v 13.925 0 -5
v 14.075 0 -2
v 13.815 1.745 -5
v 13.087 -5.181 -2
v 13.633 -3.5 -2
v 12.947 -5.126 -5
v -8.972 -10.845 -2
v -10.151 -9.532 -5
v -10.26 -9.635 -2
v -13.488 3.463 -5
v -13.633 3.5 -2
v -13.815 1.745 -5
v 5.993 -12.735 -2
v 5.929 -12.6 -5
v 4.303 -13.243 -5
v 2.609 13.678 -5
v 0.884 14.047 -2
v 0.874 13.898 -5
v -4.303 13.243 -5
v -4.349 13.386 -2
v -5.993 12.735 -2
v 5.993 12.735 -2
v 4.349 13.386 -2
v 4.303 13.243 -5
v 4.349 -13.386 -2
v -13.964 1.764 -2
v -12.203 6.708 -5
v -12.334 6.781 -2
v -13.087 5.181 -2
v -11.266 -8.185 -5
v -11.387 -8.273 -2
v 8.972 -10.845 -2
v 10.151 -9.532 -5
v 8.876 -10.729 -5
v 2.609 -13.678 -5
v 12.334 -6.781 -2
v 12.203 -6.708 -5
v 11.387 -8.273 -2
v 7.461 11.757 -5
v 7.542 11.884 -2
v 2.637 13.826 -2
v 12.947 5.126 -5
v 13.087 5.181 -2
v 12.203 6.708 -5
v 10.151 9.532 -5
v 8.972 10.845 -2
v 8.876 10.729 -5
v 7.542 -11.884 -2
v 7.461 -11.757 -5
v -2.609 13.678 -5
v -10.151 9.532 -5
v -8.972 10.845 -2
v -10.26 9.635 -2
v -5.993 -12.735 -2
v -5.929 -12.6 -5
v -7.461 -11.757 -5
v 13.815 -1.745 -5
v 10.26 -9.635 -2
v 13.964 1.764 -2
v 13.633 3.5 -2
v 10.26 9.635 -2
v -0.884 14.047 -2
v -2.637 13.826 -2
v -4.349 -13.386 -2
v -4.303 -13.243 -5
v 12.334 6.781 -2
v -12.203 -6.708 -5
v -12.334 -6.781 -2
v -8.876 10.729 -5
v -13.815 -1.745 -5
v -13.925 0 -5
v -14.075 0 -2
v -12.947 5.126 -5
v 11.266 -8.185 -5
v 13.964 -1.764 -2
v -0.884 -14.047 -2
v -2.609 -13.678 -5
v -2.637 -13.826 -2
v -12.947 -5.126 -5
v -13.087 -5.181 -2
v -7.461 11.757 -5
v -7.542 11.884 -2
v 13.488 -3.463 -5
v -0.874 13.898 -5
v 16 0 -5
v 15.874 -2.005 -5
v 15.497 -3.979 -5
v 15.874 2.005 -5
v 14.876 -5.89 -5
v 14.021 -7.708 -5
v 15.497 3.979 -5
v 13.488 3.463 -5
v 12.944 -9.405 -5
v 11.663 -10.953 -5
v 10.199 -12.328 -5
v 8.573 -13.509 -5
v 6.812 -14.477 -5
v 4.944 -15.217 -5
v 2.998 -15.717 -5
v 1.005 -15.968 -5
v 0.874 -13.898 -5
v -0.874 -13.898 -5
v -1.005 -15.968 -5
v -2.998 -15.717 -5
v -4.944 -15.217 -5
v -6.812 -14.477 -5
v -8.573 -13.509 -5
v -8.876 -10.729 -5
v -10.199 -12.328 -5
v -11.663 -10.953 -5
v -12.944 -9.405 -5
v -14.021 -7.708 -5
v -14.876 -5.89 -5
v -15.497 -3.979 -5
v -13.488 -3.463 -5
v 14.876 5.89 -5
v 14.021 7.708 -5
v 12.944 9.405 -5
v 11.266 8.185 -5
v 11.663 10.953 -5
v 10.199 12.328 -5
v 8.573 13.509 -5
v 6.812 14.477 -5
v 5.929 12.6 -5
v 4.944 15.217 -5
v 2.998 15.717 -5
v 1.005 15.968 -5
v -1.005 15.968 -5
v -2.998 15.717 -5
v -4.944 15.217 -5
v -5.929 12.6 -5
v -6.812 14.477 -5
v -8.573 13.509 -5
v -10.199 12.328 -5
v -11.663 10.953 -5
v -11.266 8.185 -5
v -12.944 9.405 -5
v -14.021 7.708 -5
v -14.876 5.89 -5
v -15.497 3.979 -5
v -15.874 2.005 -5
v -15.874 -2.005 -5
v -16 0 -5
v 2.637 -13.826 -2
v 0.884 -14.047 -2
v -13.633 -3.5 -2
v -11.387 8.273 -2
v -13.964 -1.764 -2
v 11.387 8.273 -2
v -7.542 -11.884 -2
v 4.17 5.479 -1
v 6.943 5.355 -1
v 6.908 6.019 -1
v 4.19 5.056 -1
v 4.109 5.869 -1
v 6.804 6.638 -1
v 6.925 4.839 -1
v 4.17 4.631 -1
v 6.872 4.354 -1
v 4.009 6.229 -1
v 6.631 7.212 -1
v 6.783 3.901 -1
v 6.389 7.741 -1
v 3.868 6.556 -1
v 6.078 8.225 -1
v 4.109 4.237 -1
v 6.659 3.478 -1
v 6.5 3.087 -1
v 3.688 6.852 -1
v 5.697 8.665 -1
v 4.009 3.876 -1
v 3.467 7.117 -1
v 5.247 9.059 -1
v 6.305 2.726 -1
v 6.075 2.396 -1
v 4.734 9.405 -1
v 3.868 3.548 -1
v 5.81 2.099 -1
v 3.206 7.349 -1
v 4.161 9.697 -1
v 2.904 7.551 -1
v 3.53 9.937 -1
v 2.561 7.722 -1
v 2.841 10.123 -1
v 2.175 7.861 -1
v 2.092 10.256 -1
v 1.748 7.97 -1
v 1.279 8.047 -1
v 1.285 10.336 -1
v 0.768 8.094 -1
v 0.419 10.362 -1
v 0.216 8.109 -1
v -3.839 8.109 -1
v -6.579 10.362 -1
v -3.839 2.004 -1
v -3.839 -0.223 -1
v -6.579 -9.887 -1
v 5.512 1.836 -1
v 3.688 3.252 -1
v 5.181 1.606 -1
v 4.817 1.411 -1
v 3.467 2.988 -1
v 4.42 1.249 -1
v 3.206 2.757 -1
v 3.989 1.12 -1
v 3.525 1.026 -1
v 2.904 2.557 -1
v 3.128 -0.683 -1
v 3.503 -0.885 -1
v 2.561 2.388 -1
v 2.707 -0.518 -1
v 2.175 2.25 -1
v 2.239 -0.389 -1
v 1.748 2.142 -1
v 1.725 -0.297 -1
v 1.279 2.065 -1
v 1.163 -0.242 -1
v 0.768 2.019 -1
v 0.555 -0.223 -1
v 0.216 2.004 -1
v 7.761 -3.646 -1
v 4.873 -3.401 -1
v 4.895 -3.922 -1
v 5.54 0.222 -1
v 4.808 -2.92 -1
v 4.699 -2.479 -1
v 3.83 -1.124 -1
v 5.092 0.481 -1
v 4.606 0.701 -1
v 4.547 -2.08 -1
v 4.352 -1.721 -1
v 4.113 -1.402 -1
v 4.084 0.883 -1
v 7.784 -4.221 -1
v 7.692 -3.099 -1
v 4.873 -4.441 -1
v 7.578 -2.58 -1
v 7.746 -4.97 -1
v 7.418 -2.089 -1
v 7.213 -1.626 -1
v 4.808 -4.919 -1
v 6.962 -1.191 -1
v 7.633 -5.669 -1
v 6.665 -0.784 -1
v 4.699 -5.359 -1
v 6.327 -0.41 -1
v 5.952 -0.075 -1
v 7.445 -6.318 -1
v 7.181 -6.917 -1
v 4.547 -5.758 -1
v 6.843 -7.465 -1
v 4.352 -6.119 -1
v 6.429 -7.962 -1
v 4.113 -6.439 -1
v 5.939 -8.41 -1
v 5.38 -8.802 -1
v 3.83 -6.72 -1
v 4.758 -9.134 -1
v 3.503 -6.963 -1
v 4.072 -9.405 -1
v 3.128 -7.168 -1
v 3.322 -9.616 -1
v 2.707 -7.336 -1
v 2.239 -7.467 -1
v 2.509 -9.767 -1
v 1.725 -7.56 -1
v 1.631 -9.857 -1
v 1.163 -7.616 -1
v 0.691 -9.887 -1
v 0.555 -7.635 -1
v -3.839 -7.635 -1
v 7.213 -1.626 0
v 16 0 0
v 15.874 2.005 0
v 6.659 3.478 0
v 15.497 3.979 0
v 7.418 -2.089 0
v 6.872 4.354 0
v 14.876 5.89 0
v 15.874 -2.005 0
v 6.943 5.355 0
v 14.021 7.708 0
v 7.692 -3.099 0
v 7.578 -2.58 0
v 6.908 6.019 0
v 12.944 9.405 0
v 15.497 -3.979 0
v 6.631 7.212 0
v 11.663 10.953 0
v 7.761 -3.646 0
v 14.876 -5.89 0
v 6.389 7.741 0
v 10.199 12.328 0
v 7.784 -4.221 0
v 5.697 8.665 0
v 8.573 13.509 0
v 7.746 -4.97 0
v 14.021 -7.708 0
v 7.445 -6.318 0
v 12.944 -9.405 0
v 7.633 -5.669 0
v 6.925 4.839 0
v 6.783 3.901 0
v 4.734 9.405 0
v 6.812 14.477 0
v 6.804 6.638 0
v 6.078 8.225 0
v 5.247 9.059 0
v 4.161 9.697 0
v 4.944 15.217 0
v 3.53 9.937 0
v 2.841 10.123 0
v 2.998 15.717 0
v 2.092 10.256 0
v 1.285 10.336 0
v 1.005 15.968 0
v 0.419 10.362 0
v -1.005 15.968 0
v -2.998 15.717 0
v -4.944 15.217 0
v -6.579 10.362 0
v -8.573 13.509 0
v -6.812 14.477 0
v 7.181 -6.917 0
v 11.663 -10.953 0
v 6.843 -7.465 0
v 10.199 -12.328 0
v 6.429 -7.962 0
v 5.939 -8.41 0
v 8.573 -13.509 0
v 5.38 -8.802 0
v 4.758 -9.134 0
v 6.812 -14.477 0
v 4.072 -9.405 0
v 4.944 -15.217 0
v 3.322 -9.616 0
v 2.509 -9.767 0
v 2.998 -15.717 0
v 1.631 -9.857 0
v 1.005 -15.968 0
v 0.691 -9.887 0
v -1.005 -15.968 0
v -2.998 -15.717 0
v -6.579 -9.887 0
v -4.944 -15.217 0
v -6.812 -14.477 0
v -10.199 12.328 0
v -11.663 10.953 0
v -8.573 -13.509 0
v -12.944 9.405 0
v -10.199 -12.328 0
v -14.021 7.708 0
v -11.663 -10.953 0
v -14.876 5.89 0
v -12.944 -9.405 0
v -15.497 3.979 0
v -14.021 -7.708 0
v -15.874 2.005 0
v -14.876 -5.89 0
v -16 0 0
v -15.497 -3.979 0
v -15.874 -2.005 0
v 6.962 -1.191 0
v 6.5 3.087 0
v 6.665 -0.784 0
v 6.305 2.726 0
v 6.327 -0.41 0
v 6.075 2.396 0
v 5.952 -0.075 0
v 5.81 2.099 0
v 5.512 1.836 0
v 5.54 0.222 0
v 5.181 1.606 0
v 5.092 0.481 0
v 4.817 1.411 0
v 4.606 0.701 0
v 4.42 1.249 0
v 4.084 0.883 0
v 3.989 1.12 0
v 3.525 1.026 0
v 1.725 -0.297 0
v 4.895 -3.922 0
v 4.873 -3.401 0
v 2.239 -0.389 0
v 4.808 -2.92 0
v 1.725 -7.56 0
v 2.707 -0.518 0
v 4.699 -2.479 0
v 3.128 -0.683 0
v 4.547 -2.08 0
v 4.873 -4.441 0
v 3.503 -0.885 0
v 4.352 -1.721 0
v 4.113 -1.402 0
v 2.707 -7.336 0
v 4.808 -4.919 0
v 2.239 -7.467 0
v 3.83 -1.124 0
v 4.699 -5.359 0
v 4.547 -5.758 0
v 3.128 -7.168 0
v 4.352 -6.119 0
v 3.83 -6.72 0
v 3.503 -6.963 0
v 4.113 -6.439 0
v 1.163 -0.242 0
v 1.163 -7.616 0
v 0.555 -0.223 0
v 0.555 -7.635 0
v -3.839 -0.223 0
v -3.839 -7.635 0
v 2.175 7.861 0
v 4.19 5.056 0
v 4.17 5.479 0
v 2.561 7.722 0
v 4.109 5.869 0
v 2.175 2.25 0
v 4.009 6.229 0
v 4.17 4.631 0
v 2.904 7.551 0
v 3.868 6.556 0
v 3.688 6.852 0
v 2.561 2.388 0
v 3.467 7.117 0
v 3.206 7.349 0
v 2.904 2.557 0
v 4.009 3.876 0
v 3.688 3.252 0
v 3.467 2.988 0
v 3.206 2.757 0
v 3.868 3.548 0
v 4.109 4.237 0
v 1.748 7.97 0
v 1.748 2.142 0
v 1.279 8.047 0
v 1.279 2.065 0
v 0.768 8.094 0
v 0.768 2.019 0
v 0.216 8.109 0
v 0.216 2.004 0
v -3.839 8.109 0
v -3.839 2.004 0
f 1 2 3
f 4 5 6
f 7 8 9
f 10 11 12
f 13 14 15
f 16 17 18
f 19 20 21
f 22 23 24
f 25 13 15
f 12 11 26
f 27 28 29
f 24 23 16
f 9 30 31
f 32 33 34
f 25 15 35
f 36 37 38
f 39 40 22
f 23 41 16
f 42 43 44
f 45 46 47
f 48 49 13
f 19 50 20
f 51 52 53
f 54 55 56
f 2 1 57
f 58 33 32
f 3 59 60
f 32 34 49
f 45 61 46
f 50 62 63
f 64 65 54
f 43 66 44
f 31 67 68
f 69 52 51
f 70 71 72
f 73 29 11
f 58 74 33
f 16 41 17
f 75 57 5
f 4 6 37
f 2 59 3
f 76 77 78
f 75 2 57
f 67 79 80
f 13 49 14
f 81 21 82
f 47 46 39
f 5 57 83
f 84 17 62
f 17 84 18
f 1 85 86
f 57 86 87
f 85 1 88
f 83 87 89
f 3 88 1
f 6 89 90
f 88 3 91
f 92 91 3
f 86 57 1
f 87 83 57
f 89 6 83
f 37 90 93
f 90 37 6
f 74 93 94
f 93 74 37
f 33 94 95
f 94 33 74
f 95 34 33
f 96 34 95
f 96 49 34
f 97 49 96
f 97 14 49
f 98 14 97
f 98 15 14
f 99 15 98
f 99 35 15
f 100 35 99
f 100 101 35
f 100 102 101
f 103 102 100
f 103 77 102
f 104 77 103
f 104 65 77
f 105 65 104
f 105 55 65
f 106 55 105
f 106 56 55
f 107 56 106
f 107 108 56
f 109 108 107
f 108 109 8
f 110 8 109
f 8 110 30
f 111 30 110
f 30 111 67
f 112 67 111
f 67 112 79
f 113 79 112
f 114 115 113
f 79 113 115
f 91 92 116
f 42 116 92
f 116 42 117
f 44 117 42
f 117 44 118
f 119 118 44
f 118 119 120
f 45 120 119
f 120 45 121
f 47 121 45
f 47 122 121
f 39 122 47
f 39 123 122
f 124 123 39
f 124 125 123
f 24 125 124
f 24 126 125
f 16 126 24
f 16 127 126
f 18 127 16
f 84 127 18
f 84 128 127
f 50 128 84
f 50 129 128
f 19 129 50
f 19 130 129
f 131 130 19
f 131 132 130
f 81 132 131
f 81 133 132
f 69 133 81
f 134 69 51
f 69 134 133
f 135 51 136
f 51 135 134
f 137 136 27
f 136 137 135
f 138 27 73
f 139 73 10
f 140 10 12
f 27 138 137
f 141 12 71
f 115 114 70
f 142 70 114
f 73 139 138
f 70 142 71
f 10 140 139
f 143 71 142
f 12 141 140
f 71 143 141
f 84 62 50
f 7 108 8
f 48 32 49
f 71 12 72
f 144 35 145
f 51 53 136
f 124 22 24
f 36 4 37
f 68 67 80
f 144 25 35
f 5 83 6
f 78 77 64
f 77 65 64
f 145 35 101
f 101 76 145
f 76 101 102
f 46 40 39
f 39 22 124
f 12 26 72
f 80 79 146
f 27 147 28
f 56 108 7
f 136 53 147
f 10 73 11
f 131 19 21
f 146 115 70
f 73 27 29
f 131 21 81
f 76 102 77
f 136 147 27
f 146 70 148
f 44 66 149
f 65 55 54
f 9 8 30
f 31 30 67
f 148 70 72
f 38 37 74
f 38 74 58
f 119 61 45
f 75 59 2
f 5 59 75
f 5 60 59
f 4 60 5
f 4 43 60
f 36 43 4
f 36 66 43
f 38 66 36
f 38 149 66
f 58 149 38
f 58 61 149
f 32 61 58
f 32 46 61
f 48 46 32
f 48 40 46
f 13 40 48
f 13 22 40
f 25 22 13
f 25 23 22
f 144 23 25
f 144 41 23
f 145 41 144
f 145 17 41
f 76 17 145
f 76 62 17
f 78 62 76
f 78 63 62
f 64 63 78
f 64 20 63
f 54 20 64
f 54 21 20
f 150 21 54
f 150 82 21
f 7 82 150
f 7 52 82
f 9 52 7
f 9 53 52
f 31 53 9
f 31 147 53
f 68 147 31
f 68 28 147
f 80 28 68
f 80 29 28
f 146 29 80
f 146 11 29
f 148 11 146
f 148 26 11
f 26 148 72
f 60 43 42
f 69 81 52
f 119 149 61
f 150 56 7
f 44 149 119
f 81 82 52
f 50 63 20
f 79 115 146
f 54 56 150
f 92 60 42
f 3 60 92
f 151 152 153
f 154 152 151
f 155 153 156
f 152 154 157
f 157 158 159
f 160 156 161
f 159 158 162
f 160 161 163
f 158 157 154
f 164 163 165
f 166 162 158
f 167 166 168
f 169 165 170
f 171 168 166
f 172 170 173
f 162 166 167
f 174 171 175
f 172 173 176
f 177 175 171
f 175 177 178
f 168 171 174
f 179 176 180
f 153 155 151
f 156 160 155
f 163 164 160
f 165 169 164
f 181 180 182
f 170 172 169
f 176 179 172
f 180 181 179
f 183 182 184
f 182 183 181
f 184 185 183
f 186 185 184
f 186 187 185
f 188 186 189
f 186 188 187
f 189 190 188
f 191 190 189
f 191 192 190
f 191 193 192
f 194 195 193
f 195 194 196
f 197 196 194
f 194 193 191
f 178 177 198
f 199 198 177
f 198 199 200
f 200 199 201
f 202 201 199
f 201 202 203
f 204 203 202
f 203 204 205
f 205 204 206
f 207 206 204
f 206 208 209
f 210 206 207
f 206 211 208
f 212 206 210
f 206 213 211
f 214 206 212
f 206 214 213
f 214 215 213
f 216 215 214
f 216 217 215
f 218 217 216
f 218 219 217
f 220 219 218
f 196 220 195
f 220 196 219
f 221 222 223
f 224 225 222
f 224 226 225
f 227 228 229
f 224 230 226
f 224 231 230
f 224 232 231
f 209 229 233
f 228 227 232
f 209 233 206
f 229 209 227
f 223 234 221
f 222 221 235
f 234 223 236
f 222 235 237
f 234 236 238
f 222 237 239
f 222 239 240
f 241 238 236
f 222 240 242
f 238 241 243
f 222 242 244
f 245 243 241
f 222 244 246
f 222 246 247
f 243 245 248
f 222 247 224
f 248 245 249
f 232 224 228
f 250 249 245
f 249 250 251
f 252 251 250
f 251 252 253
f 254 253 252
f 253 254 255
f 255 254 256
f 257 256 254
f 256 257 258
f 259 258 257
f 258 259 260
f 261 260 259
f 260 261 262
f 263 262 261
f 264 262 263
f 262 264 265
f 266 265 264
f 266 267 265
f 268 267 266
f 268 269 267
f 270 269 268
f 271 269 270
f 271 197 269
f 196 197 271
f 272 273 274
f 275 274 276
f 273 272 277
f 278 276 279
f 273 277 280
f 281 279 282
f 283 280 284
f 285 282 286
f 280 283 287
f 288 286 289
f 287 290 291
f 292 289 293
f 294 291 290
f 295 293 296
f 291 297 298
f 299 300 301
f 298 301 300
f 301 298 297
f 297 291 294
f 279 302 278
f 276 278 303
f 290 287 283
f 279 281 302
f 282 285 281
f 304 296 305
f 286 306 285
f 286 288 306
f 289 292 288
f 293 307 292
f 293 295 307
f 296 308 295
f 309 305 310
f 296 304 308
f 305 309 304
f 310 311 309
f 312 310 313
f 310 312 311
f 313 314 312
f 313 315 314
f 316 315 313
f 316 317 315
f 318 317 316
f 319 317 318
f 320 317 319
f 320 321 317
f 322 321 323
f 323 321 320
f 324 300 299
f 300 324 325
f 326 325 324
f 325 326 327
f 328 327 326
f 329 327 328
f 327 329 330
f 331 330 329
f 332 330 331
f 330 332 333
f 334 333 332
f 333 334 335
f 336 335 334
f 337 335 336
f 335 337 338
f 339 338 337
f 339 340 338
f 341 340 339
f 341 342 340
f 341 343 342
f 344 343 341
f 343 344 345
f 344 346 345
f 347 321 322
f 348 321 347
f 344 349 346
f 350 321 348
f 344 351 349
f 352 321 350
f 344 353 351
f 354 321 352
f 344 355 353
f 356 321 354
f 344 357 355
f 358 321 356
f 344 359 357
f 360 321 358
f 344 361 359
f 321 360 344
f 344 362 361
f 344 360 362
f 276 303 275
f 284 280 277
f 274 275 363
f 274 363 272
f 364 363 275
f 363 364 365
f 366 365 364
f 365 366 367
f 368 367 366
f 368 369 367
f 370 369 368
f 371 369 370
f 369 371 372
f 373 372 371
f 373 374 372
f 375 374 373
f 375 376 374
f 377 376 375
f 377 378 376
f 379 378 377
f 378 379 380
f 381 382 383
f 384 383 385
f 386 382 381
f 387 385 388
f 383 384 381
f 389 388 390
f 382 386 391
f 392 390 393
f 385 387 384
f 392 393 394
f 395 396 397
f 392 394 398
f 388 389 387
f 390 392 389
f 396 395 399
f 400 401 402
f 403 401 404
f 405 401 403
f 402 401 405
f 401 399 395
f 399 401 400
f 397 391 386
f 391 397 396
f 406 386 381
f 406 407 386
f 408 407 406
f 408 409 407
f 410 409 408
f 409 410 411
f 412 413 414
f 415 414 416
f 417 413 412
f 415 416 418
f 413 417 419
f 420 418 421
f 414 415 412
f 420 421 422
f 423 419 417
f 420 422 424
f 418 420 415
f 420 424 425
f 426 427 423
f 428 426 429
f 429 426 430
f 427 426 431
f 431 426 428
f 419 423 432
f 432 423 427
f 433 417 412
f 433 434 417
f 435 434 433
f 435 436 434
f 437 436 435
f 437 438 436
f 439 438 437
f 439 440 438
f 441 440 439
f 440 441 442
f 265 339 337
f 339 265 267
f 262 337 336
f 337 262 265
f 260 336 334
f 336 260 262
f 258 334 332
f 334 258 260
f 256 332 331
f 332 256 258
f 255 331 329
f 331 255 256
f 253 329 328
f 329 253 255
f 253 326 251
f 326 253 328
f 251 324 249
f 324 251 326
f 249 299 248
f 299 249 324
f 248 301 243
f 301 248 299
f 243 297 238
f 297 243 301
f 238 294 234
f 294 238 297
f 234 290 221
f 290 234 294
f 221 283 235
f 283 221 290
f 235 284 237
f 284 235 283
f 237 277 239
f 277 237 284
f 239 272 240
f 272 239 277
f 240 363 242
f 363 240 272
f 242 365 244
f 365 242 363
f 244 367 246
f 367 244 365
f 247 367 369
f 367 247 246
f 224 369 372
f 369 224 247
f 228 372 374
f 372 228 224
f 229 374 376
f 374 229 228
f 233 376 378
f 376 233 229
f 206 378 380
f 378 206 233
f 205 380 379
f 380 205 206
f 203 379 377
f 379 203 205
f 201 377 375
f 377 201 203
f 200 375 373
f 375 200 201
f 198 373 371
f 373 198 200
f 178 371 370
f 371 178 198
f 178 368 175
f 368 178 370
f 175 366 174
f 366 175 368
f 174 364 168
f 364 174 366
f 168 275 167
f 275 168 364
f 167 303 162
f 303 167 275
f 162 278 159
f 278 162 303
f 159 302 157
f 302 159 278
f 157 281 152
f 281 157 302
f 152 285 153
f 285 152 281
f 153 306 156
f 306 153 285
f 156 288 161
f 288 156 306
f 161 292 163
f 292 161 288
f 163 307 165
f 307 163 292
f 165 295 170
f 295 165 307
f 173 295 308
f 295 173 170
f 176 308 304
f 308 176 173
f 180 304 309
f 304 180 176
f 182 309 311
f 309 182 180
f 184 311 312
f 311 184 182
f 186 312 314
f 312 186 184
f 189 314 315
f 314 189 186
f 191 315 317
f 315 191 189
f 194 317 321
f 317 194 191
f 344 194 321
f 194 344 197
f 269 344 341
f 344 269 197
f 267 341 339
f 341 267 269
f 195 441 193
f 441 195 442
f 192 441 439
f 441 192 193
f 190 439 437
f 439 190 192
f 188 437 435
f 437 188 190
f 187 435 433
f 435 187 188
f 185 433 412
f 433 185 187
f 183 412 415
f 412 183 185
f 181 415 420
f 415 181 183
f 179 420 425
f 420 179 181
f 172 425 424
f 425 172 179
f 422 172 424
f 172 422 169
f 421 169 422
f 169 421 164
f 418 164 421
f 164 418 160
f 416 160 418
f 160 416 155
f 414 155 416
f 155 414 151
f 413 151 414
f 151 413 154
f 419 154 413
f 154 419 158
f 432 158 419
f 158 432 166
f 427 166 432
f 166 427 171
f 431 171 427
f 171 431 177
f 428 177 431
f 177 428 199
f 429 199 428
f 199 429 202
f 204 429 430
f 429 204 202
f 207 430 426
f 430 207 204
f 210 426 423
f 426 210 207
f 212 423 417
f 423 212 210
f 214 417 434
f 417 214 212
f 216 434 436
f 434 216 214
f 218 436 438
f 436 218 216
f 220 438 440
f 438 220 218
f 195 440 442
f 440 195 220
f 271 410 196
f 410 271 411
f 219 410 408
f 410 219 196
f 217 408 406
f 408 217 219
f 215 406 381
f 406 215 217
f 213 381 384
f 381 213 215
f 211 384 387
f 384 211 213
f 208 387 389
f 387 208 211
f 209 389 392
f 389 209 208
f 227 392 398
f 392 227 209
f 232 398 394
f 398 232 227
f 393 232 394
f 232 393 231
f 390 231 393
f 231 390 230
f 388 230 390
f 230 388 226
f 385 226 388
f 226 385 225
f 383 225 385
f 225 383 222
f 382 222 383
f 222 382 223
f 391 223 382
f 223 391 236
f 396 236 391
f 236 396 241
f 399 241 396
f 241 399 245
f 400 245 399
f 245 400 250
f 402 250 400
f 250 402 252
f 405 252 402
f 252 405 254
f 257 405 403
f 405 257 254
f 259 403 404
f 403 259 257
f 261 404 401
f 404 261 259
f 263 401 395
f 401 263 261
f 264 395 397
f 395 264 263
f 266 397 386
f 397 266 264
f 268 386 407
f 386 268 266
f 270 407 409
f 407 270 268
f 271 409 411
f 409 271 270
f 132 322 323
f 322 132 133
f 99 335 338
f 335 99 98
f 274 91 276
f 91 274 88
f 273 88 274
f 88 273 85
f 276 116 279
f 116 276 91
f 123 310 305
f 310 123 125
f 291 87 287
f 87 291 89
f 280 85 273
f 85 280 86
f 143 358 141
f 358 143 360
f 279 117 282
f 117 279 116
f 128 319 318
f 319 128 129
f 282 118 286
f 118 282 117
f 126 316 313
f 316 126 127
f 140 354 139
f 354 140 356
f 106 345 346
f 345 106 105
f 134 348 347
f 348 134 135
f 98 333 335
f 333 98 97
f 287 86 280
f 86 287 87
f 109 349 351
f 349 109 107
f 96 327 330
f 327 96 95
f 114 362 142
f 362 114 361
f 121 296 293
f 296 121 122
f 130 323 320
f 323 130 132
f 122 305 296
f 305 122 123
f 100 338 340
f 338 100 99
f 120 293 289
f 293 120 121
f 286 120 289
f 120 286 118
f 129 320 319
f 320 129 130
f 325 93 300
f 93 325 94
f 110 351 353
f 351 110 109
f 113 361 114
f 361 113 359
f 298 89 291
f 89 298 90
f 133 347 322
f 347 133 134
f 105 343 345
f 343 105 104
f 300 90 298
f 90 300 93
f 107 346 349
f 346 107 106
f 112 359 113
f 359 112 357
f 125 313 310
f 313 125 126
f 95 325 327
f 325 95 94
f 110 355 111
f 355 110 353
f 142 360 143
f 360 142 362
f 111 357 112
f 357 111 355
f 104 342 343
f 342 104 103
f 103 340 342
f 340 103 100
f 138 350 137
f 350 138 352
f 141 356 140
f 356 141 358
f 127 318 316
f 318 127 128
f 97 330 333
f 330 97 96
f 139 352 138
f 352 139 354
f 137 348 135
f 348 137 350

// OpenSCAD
$fn = 50;


difference() {
	union() {
		translate(v = [0, 0, -5.0000000000]) {
			cylinder(h = 5, r = 16.0000000000);
		}
	}
	union() {
		#translate(v = [0, 0, -5.0000000000]) {
			cylinder(h = 3, r1 = 13.9250000000, r2 = 14.0750000000);
		}
		translate(v = [0, 0, -1]) {
			linear_extrude(height = 1) {
				text(font = "Impact", halign = "center", size = 20, text = "B", valign = "center");
			}
		}
	}
}
